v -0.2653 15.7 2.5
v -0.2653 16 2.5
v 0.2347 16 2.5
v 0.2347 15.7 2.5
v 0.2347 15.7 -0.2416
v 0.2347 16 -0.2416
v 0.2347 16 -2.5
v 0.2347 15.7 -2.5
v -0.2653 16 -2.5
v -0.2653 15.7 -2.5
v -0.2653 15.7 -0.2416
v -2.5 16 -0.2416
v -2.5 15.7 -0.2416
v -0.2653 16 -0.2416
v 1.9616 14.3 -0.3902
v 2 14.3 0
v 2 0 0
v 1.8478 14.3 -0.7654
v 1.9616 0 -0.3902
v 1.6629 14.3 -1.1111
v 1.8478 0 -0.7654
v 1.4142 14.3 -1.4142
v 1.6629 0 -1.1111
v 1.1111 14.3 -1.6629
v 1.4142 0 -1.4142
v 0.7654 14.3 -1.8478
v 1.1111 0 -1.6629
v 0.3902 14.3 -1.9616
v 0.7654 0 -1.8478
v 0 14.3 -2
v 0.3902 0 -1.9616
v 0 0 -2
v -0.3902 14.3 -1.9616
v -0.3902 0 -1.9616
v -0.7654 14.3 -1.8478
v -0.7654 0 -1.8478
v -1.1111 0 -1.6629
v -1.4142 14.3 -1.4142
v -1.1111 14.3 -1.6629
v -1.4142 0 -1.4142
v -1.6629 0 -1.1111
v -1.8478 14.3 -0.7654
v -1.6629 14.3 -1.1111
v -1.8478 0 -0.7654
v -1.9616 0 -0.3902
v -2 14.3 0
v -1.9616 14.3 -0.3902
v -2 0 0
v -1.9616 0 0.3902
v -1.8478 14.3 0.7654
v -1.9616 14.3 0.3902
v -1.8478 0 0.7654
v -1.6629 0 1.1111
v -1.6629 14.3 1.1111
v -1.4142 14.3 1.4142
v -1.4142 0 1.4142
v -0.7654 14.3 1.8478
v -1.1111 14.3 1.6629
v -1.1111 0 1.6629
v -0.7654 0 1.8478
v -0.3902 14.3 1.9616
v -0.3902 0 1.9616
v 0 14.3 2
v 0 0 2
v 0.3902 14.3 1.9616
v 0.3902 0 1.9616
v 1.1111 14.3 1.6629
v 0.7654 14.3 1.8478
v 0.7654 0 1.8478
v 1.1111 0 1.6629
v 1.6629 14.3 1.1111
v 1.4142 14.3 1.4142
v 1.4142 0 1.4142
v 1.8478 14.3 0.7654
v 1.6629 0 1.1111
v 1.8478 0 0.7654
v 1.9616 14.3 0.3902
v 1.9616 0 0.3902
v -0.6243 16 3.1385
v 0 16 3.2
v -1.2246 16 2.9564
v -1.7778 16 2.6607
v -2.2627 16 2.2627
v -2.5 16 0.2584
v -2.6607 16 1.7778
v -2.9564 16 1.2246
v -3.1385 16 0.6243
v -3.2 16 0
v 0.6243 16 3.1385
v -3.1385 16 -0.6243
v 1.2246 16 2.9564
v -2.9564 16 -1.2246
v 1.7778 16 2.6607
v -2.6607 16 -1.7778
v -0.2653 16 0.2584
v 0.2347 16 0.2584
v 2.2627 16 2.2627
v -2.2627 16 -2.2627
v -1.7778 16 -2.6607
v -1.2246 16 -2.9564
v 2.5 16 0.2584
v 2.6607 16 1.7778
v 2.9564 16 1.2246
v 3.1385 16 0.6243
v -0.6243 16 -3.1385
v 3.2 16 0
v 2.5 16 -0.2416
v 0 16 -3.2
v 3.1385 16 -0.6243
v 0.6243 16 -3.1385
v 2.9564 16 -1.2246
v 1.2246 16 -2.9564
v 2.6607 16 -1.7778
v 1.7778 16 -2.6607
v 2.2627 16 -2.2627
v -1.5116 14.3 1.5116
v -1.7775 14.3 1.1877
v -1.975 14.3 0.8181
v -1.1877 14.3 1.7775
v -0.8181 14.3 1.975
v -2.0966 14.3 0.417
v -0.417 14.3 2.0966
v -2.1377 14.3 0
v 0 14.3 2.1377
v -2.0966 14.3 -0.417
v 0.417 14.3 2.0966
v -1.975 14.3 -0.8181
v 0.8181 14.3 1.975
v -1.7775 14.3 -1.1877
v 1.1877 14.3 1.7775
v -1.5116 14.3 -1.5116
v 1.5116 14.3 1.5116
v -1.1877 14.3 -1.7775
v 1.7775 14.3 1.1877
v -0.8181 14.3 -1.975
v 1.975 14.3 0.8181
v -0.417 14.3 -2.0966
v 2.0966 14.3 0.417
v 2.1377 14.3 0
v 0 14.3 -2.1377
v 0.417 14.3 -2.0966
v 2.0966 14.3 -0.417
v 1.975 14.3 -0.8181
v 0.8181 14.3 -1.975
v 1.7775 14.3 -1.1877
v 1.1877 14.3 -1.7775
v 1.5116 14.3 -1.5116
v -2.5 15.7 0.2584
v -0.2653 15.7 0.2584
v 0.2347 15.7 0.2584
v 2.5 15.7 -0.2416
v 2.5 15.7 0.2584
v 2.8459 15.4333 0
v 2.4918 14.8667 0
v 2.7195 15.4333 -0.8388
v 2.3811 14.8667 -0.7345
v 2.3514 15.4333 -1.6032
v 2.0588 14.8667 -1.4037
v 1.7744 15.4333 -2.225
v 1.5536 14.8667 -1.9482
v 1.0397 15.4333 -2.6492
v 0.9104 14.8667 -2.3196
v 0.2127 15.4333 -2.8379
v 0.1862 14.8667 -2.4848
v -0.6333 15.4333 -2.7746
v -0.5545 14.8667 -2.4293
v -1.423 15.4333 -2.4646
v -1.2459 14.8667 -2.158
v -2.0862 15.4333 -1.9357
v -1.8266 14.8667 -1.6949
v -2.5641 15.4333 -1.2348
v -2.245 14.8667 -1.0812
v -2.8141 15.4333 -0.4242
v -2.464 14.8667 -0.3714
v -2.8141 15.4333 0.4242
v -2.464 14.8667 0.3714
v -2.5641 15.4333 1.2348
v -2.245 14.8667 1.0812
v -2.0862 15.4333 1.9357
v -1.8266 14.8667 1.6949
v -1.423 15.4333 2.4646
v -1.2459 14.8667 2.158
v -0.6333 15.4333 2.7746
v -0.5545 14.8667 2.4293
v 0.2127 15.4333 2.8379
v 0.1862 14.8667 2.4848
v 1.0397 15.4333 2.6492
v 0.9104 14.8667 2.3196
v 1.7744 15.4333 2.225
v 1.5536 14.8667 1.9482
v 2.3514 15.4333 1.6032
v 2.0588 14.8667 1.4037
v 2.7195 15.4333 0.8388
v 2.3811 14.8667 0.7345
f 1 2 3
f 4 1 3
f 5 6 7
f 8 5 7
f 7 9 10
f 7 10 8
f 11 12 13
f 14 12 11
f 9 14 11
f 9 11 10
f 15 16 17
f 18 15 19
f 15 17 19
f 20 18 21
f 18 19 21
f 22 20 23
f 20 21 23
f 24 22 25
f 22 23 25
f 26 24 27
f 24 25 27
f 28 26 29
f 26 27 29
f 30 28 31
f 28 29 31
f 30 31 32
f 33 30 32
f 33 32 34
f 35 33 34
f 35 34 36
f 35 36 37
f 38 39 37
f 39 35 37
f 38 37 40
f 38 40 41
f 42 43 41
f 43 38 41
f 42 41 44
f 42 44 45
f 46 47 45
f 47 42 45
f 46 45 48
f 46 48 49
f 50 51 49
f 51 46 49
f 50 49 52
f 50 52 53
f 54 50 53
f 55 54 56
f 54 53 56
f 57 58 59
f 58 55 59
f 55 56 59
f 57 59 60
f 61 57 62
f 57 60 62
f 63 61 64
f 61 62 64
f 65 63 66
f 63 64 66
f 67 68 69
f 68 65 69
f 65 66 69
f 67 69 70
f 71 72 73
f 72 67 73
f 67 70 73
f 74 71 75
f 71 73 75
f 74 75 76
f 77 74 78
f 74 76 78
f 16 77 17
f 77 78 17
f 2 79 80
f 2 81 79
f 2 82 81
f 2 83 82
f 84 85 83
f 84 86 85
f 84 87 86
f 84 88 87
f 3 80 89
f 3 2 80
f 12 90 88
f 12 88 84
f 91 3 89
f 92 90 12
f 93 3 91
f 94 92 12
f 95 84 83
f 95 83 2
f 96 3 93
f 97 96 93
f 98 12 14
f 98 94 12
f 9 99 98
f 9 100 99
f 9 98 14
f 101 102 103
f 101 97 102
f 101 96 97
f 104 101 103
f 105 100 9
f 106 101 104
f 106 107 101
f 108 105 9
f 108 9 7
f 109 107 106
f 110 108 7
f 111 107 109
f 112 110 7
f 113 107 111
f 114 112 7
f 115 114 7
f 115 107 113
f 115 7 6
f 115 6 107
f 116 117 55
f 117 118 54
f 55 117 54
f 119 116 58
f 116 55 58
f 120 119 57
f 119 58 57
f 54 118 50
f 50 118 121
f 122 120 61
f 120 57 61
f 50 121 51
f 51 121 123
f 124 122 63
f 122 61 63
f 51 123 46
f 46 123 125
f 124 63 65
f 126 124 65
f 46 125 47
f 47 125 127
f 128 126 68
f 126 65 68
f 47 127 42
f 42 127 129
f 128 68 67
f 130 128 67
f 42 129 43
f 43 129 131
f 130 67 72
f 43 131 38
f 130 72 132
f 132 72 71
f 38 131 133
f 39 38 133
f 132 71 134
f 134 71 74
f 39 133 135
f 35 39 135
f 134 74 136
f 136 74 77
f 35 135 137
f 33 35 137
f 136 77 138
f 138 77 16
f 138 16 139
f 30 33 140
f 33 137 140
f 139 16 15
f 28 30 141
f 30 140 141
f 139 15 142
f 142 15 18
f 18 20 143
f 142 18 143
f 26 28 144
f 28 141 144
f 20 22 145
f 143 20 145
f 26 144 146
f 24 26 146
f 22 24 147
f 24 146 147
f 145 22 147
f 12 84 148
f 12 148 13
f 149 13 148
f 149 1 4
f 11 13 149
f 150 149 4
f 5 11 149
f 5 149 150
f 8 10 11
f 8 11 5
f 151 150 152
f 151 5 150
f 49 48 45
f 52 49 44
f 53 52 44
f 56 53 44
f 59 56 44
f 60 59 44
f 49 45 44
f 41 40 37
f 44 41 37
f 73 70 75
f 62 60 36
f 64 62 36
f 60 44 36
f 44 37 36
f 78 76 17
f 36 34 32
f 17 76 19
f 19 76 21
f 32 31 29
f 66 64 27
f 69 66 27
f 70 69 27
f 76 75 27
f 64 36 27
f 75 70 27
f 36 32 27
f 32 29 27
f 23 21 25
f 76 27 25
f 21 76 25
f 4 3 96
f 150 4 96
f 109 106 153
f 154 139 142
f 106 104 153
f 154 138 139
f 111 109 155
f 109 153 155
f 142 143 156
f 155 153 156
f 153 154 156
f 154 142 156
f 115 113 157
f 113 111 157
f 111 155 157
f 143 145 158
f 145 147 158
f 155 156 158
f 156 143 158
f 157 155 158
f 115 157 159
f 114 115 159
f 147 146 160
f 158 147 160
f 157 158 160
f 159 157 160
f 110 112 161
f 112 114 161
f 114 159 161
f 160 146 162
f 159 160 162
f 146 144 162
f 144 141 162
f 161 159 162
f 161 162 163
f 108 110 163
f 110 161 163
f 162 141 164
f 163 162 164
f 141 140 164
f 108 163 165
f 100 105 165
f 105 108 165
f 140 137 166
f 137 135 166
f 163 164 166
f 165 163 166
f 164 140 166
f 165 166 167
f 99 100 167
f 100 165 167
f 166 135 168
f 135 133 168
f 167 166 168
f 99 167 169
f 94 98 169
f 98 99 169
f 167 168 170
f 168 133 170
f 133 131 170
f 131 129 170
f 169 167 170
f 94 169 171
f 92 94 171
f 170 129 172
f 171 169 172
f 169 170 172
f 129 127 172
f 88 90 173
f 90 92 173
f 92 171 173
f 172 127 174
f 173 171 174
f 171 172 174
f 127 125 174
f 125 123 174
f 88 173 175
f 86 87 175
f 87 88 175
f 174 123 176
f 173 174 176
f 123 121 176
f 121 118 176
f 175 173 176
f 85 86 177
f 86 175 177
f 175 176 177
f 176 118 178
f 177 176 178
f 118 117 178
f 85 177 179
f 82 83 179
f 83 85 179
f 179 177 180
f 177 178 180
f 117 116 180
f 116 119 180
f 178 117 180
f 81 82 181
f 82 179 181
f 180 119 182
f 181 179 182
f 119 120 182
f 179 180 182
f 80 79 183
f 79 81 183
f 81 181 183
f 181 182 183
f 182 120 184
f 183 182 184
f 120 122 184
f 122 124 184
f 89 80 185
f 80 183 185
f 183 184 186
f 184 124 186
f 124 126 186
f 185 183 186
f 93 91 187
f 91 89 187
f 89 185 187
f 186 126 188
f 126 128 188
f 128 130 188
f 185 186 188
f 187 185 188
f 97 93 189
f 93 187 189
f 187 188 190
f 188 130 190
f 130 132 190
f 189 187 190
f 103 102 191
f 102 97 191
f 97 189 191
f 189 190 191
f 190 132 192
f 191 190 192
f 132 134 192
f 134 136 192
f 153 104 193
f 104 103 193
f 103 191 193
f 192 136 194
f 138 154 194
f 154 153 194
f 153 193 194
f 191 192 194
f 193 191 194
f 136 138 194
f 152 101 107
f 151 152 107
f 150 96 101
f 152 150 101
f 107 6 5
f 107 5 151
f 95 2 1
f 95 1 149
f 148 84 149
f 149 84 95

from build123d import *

# Parameters (mm, degrees)
SKETCH1_R           = 2
BOSS_EXTRUDE1_DEPTH = 16
SKETCH2_R           = 3.2
BOSS_EXTRUDE2_DEPTH = 1.7
BOSS_EXTRUDE2_TAPER = 32
SKETCH3_W           = 0.5
SKETCH3_H           = 2.258378485
SKETCH3_H_2         = 2.241621515
SKETCH3_W_2         = 2.234727157
SKETCH3_H_3         = 0.5
SKETCH3_W_3         = 2.265272843
CUT_EXTRUDE1_DEPTH  = 0.3


with BuildPart() as part:
    # Sketch1 → Boss-Extrude1 (new body)
    with BuildSketch(Plane(origin=(0, 0, 0), x_dir=(1, 0, 0), z_dir=(0, 1, 0))):
        Circle(SKETCH1_R)
    extrude(amount=BOSS_EXTRUDE1_DEPTH)

    # Sketch2 → Boss-Extrude2 (add)
    with BuildSketch(Plane(origin=(0, 16, 0), x_dir=(1, 0, 0), z_dir=(0, 1, 0))):
        Circle(SKETCH2_R)
    extrude(amount=-BOSS_EXTRUDE2_DEPTH, taper=BOSS_EXTRUDE2_TAPER)

    # Sketch3 → Cut-Extrude1 (cut)
    with BuildSketch(Plane(origin=(0, 16, 0), x_dir=(1, 0, 0), z_dir=(0, 1, 0))):
        with Locations((-0.015272843, 1.370810757)):
            Rectangle(SKETCH3_W, SKETCH3_H)
        with Locations((-0.015272843, -1.379189243)):
            Rectangle(SKETCH3_W, SKETCH3_H_2)
        with Locations((-1.382636421, -0.008378485)):
            Rectangle(SKETCH3_W_2, SKETCH3_H_3)
        with Locations((1.367363579, -0.008378485)):
            Rectangle(SKETCH3_W_3, SKETCH3_H_3)
        with Locations((-0.015272843, -0.008378485)):
            Rectangle(SKETCH3_W, SKETCH3_H_3)
    extrude(amount=-CUT_EXTRUDE1_DEPTH, mode=Mode.SUBTRACT)


solid = part.part
